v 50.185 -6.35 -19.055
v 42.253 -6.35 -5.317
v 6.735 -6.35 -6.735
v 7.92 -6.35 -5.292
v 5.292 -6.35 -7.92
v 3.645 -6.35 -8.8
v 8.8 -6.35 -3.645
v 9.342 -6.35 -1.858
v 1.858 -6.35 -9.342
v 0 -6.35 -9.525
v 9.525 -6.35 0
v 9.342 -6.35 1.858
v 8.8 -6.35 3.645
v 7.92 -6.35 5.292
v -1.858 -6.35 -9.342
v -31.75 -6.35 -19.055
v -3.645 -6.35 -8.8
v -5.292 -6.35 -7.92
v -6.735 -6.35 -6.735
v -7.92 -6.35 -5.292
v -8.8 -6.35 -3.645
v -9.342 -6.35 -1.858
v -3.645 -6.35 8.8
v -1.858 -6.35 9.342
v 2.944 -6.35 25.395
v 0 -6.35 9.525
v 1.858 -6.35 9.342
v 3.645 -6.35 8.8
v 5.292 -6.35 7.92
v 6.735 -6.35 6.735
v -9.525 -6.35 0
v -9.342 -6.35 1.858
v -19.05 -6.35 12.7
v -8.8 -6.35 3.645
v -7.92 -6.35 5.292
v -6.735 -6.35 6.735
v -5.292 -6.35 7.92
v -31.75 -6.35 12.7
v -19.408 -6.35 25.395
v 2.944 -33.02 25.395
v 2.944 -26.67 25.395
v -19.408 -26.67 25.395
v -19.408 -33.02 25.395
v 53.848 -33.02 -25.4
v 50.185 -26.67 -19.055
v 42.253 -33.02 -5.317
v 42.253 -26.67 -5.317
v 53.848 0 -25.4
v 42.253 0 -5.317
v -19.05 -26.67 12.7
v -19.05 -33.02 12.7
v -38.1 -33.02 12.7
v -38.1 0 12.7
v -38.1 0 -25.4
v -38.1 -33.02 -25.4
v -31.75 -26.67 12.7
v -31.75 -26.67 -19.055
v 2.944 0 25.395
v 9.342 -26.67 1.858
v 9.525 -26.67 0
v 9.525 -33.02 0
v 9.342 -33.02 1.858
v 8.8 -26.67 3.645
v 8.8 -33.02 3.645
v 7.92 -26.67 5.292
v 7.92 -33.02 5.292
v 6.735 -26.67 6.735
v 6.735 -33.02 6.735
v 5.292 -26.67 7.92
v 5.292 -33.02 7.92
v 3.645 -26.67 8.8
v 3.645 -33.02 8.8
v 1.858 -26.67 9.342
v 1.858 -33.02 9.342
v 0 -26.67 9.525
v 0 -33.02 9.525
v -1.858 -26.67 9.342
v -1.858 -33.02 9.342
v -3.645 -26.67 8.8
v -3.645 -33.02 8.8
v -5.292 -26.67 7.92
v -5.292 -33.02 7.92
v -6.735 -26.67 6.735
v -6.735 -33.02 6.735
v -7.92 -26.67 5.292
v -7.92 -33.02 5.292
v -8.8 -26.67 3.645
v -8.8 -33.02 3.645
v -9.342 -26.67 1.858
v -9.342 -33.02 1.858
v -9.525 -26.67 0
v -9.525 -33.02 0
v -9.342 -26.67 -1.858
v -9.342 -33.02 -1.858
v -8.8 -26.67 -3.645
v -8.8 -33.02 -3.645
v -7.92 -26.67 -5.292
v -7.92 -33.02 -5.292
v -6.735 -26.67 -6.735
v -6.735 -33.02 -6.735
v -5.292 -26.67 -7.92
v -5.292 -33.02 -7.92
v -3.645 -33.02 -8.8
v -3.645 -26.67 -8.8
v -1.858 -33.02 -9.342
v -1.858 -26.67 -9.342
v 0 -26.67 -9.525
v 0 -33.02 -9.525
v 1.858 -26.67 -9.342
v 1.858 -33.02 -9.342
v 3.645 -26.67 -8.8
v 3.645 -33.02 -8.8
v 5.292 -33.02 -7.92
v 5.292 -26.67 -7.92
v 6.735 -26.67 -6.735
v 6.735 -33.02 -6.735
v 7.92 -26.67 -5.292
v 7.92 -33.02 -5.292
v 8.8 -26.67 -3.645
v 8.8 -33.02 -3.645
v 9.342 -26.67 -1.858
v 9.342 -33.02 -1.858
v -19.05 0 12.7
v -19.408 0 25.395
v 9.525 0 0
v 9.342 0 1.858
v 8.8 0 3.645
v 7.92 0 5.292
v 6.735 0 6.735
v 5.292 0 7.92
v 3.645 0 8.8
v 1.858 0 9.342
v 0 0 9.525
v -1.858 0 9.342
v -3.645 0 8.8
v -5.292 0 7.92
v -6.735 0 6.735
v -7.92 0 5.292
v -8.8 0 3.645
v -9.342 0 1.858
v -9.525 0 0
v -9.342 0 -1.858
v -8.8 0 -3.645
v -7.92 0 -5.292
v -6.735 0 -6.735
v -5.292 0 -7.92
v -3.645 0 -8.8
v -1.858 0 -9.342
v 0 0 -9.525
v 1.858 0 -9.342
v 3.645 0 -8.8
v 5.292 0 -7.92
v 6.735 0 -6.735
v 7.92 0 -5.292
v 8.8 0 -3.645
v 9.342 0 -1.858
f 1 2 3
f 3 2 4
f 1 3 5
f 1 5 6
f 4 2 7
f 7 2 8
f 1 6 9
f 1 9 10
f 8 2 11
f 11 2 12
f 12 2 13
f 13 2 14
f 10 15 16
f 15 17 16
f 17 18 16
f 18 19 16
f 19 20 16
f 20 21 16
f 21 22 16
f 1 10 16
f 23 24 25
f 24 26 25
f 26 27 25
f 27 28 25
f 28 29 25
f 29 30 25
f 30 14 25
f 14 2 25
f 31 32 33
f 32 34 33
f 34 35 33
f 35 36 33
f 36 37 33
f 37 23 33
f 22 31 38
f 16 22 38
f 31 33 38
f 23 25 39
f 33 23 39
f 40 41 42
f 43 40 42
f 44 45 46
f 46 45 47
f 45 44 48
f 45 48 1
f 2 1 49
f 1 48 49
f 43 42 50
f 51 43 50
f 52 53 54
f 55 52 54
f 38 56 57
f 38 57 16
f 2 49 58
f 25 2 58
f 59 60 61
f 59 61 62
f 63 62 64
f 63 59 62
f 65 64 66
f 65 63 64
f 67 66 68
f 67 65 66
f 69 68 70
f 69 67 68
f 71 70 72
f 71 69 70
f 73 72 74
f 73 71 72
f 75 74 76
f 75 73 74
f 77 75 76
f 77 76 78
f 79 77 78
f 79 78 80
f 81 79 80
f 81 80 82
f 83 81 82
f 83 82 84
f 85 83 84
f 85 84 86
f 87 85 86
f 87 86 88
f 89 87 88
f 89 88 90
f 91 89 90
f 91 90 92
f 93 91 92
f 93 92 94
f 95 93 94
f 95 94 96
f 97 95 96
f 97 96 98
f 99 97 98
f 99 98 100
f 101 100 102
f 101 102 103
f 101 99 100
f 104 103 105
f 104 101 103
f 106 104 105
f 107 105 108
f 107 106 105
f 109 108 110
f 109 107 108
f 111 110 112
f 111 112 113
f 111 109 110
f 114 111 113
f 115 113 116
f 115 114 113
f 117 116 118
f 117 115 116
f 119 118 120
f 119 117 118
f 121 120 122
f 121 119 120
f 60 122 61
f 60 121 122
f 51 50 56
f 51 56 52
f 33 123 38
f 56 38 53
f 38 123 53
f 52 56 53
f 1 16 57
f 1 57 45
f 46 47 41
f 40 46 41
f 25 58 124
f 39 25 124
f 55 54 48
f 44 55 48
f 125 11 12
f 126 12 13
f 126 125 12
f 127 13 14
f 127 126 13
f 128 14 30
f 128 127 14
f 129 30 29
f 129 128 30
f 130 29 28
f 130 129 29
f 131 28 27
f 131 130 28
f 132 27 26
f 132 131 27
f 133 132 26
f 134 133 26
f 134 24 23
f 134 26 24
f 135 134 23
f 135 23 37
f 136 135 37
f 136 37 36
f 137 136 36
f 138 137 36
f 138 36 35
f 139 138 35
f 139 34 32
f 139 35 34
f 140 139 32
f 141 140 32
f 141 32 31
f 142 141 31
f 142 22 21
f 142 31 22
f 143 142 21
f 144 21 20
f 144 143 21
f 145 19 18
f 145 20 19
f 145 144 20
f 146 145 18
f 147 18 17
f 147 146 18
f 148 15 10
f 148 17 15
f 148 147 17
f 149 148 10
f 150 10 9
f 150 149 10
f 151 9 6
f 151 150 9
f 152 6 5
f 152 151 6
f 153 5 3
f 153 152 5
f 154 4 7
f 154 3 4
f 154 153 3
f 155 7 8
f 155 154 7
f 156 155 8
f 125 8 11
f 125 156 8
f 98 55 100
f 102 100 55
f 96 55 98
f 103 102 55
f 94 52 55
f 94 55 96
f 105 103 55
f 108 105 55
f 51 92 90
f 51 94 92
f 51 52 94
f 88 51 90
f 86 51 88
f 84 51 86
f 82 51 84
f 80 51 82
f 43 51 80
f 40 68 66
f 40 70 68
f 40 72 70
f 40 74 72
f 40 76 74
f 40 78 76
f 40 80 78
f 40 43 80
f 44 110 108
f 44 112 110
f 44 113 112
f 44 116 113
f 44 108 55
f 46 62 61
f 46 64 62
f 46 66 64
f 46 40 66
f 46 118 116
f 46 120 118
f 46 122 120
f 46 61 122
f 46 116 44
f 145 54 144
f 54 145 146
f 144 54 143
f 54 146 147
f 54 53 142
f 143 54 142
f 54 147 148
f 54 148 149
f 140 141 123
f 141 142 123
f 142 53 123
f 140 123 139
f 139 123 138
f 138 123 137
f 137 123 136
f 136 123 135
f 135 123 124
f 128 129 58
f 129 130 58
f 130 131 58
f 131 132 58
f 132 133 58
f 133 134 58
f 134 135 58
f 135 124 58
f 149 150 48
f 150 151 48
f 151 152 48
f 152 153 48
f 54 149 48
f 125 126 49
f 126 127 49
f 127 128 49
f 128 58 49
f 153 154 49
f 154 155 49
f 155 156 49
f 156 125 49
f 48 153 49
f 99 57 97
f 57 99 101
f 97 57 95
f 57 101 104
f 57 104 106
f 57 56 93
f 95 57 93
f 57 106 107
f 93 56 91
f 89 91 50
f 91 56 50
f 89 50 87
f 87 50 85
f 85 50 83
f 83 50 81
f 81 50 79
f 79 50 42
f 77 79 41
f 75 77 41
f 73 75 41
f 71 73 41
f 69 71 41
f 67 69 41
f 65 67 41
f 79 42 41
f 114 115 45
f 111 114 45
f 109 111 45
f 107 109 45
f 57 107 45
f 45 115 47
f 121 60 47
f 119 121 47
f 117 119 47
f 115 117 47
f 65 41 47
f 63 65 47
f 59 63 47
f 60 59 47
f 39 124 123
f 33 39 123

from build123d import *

# Parameters (mm, degrees)
F0_R     = 9.525
F1_DEPTH = 33.02
F2_W     = 12.3416540065
F2_H     = 20.32
F2_W_2   = 22.352
F2_W_3   = 50.9043459935
F3_DEPTH = 44.45


with BuildPart() as f1:
    # F0 (on Front) → F1 (new body)
    with BuildSketch(Plane.XZ):
        Polygon((2.9436540065, 25.3949434087), (-19.4083459935, 25.3949434087), (-19.05, 12.7), (-38.1, 12.7), (-38.1, -25.4), (53.848, -25.4), (42.2530133757, -5.3168940537), align=None)
        Circle(F0_R, mode=Mode.SUBTRACT)
    extrude(amount=F1_DEPTH)

    # F2 (on face) → F3 (cut)
    with BuildSketch(Plane.XY.offset(25.3949434087)):
        with Locations((-25.5791729967, -16.51)):
            Rectangle(F2_W, F2_H)
        with Locations((-8.2323459935, -16.51)):
            Rectangle(F2_W_2, F2_H)
        with Locations((28.3958270033, -16.51)):
            Rectangle(F2_W_3, F2_H)
    extrude(amount=-F3_DEPTH, mode=Mode.SUBTRACT)


solid = f1.part
